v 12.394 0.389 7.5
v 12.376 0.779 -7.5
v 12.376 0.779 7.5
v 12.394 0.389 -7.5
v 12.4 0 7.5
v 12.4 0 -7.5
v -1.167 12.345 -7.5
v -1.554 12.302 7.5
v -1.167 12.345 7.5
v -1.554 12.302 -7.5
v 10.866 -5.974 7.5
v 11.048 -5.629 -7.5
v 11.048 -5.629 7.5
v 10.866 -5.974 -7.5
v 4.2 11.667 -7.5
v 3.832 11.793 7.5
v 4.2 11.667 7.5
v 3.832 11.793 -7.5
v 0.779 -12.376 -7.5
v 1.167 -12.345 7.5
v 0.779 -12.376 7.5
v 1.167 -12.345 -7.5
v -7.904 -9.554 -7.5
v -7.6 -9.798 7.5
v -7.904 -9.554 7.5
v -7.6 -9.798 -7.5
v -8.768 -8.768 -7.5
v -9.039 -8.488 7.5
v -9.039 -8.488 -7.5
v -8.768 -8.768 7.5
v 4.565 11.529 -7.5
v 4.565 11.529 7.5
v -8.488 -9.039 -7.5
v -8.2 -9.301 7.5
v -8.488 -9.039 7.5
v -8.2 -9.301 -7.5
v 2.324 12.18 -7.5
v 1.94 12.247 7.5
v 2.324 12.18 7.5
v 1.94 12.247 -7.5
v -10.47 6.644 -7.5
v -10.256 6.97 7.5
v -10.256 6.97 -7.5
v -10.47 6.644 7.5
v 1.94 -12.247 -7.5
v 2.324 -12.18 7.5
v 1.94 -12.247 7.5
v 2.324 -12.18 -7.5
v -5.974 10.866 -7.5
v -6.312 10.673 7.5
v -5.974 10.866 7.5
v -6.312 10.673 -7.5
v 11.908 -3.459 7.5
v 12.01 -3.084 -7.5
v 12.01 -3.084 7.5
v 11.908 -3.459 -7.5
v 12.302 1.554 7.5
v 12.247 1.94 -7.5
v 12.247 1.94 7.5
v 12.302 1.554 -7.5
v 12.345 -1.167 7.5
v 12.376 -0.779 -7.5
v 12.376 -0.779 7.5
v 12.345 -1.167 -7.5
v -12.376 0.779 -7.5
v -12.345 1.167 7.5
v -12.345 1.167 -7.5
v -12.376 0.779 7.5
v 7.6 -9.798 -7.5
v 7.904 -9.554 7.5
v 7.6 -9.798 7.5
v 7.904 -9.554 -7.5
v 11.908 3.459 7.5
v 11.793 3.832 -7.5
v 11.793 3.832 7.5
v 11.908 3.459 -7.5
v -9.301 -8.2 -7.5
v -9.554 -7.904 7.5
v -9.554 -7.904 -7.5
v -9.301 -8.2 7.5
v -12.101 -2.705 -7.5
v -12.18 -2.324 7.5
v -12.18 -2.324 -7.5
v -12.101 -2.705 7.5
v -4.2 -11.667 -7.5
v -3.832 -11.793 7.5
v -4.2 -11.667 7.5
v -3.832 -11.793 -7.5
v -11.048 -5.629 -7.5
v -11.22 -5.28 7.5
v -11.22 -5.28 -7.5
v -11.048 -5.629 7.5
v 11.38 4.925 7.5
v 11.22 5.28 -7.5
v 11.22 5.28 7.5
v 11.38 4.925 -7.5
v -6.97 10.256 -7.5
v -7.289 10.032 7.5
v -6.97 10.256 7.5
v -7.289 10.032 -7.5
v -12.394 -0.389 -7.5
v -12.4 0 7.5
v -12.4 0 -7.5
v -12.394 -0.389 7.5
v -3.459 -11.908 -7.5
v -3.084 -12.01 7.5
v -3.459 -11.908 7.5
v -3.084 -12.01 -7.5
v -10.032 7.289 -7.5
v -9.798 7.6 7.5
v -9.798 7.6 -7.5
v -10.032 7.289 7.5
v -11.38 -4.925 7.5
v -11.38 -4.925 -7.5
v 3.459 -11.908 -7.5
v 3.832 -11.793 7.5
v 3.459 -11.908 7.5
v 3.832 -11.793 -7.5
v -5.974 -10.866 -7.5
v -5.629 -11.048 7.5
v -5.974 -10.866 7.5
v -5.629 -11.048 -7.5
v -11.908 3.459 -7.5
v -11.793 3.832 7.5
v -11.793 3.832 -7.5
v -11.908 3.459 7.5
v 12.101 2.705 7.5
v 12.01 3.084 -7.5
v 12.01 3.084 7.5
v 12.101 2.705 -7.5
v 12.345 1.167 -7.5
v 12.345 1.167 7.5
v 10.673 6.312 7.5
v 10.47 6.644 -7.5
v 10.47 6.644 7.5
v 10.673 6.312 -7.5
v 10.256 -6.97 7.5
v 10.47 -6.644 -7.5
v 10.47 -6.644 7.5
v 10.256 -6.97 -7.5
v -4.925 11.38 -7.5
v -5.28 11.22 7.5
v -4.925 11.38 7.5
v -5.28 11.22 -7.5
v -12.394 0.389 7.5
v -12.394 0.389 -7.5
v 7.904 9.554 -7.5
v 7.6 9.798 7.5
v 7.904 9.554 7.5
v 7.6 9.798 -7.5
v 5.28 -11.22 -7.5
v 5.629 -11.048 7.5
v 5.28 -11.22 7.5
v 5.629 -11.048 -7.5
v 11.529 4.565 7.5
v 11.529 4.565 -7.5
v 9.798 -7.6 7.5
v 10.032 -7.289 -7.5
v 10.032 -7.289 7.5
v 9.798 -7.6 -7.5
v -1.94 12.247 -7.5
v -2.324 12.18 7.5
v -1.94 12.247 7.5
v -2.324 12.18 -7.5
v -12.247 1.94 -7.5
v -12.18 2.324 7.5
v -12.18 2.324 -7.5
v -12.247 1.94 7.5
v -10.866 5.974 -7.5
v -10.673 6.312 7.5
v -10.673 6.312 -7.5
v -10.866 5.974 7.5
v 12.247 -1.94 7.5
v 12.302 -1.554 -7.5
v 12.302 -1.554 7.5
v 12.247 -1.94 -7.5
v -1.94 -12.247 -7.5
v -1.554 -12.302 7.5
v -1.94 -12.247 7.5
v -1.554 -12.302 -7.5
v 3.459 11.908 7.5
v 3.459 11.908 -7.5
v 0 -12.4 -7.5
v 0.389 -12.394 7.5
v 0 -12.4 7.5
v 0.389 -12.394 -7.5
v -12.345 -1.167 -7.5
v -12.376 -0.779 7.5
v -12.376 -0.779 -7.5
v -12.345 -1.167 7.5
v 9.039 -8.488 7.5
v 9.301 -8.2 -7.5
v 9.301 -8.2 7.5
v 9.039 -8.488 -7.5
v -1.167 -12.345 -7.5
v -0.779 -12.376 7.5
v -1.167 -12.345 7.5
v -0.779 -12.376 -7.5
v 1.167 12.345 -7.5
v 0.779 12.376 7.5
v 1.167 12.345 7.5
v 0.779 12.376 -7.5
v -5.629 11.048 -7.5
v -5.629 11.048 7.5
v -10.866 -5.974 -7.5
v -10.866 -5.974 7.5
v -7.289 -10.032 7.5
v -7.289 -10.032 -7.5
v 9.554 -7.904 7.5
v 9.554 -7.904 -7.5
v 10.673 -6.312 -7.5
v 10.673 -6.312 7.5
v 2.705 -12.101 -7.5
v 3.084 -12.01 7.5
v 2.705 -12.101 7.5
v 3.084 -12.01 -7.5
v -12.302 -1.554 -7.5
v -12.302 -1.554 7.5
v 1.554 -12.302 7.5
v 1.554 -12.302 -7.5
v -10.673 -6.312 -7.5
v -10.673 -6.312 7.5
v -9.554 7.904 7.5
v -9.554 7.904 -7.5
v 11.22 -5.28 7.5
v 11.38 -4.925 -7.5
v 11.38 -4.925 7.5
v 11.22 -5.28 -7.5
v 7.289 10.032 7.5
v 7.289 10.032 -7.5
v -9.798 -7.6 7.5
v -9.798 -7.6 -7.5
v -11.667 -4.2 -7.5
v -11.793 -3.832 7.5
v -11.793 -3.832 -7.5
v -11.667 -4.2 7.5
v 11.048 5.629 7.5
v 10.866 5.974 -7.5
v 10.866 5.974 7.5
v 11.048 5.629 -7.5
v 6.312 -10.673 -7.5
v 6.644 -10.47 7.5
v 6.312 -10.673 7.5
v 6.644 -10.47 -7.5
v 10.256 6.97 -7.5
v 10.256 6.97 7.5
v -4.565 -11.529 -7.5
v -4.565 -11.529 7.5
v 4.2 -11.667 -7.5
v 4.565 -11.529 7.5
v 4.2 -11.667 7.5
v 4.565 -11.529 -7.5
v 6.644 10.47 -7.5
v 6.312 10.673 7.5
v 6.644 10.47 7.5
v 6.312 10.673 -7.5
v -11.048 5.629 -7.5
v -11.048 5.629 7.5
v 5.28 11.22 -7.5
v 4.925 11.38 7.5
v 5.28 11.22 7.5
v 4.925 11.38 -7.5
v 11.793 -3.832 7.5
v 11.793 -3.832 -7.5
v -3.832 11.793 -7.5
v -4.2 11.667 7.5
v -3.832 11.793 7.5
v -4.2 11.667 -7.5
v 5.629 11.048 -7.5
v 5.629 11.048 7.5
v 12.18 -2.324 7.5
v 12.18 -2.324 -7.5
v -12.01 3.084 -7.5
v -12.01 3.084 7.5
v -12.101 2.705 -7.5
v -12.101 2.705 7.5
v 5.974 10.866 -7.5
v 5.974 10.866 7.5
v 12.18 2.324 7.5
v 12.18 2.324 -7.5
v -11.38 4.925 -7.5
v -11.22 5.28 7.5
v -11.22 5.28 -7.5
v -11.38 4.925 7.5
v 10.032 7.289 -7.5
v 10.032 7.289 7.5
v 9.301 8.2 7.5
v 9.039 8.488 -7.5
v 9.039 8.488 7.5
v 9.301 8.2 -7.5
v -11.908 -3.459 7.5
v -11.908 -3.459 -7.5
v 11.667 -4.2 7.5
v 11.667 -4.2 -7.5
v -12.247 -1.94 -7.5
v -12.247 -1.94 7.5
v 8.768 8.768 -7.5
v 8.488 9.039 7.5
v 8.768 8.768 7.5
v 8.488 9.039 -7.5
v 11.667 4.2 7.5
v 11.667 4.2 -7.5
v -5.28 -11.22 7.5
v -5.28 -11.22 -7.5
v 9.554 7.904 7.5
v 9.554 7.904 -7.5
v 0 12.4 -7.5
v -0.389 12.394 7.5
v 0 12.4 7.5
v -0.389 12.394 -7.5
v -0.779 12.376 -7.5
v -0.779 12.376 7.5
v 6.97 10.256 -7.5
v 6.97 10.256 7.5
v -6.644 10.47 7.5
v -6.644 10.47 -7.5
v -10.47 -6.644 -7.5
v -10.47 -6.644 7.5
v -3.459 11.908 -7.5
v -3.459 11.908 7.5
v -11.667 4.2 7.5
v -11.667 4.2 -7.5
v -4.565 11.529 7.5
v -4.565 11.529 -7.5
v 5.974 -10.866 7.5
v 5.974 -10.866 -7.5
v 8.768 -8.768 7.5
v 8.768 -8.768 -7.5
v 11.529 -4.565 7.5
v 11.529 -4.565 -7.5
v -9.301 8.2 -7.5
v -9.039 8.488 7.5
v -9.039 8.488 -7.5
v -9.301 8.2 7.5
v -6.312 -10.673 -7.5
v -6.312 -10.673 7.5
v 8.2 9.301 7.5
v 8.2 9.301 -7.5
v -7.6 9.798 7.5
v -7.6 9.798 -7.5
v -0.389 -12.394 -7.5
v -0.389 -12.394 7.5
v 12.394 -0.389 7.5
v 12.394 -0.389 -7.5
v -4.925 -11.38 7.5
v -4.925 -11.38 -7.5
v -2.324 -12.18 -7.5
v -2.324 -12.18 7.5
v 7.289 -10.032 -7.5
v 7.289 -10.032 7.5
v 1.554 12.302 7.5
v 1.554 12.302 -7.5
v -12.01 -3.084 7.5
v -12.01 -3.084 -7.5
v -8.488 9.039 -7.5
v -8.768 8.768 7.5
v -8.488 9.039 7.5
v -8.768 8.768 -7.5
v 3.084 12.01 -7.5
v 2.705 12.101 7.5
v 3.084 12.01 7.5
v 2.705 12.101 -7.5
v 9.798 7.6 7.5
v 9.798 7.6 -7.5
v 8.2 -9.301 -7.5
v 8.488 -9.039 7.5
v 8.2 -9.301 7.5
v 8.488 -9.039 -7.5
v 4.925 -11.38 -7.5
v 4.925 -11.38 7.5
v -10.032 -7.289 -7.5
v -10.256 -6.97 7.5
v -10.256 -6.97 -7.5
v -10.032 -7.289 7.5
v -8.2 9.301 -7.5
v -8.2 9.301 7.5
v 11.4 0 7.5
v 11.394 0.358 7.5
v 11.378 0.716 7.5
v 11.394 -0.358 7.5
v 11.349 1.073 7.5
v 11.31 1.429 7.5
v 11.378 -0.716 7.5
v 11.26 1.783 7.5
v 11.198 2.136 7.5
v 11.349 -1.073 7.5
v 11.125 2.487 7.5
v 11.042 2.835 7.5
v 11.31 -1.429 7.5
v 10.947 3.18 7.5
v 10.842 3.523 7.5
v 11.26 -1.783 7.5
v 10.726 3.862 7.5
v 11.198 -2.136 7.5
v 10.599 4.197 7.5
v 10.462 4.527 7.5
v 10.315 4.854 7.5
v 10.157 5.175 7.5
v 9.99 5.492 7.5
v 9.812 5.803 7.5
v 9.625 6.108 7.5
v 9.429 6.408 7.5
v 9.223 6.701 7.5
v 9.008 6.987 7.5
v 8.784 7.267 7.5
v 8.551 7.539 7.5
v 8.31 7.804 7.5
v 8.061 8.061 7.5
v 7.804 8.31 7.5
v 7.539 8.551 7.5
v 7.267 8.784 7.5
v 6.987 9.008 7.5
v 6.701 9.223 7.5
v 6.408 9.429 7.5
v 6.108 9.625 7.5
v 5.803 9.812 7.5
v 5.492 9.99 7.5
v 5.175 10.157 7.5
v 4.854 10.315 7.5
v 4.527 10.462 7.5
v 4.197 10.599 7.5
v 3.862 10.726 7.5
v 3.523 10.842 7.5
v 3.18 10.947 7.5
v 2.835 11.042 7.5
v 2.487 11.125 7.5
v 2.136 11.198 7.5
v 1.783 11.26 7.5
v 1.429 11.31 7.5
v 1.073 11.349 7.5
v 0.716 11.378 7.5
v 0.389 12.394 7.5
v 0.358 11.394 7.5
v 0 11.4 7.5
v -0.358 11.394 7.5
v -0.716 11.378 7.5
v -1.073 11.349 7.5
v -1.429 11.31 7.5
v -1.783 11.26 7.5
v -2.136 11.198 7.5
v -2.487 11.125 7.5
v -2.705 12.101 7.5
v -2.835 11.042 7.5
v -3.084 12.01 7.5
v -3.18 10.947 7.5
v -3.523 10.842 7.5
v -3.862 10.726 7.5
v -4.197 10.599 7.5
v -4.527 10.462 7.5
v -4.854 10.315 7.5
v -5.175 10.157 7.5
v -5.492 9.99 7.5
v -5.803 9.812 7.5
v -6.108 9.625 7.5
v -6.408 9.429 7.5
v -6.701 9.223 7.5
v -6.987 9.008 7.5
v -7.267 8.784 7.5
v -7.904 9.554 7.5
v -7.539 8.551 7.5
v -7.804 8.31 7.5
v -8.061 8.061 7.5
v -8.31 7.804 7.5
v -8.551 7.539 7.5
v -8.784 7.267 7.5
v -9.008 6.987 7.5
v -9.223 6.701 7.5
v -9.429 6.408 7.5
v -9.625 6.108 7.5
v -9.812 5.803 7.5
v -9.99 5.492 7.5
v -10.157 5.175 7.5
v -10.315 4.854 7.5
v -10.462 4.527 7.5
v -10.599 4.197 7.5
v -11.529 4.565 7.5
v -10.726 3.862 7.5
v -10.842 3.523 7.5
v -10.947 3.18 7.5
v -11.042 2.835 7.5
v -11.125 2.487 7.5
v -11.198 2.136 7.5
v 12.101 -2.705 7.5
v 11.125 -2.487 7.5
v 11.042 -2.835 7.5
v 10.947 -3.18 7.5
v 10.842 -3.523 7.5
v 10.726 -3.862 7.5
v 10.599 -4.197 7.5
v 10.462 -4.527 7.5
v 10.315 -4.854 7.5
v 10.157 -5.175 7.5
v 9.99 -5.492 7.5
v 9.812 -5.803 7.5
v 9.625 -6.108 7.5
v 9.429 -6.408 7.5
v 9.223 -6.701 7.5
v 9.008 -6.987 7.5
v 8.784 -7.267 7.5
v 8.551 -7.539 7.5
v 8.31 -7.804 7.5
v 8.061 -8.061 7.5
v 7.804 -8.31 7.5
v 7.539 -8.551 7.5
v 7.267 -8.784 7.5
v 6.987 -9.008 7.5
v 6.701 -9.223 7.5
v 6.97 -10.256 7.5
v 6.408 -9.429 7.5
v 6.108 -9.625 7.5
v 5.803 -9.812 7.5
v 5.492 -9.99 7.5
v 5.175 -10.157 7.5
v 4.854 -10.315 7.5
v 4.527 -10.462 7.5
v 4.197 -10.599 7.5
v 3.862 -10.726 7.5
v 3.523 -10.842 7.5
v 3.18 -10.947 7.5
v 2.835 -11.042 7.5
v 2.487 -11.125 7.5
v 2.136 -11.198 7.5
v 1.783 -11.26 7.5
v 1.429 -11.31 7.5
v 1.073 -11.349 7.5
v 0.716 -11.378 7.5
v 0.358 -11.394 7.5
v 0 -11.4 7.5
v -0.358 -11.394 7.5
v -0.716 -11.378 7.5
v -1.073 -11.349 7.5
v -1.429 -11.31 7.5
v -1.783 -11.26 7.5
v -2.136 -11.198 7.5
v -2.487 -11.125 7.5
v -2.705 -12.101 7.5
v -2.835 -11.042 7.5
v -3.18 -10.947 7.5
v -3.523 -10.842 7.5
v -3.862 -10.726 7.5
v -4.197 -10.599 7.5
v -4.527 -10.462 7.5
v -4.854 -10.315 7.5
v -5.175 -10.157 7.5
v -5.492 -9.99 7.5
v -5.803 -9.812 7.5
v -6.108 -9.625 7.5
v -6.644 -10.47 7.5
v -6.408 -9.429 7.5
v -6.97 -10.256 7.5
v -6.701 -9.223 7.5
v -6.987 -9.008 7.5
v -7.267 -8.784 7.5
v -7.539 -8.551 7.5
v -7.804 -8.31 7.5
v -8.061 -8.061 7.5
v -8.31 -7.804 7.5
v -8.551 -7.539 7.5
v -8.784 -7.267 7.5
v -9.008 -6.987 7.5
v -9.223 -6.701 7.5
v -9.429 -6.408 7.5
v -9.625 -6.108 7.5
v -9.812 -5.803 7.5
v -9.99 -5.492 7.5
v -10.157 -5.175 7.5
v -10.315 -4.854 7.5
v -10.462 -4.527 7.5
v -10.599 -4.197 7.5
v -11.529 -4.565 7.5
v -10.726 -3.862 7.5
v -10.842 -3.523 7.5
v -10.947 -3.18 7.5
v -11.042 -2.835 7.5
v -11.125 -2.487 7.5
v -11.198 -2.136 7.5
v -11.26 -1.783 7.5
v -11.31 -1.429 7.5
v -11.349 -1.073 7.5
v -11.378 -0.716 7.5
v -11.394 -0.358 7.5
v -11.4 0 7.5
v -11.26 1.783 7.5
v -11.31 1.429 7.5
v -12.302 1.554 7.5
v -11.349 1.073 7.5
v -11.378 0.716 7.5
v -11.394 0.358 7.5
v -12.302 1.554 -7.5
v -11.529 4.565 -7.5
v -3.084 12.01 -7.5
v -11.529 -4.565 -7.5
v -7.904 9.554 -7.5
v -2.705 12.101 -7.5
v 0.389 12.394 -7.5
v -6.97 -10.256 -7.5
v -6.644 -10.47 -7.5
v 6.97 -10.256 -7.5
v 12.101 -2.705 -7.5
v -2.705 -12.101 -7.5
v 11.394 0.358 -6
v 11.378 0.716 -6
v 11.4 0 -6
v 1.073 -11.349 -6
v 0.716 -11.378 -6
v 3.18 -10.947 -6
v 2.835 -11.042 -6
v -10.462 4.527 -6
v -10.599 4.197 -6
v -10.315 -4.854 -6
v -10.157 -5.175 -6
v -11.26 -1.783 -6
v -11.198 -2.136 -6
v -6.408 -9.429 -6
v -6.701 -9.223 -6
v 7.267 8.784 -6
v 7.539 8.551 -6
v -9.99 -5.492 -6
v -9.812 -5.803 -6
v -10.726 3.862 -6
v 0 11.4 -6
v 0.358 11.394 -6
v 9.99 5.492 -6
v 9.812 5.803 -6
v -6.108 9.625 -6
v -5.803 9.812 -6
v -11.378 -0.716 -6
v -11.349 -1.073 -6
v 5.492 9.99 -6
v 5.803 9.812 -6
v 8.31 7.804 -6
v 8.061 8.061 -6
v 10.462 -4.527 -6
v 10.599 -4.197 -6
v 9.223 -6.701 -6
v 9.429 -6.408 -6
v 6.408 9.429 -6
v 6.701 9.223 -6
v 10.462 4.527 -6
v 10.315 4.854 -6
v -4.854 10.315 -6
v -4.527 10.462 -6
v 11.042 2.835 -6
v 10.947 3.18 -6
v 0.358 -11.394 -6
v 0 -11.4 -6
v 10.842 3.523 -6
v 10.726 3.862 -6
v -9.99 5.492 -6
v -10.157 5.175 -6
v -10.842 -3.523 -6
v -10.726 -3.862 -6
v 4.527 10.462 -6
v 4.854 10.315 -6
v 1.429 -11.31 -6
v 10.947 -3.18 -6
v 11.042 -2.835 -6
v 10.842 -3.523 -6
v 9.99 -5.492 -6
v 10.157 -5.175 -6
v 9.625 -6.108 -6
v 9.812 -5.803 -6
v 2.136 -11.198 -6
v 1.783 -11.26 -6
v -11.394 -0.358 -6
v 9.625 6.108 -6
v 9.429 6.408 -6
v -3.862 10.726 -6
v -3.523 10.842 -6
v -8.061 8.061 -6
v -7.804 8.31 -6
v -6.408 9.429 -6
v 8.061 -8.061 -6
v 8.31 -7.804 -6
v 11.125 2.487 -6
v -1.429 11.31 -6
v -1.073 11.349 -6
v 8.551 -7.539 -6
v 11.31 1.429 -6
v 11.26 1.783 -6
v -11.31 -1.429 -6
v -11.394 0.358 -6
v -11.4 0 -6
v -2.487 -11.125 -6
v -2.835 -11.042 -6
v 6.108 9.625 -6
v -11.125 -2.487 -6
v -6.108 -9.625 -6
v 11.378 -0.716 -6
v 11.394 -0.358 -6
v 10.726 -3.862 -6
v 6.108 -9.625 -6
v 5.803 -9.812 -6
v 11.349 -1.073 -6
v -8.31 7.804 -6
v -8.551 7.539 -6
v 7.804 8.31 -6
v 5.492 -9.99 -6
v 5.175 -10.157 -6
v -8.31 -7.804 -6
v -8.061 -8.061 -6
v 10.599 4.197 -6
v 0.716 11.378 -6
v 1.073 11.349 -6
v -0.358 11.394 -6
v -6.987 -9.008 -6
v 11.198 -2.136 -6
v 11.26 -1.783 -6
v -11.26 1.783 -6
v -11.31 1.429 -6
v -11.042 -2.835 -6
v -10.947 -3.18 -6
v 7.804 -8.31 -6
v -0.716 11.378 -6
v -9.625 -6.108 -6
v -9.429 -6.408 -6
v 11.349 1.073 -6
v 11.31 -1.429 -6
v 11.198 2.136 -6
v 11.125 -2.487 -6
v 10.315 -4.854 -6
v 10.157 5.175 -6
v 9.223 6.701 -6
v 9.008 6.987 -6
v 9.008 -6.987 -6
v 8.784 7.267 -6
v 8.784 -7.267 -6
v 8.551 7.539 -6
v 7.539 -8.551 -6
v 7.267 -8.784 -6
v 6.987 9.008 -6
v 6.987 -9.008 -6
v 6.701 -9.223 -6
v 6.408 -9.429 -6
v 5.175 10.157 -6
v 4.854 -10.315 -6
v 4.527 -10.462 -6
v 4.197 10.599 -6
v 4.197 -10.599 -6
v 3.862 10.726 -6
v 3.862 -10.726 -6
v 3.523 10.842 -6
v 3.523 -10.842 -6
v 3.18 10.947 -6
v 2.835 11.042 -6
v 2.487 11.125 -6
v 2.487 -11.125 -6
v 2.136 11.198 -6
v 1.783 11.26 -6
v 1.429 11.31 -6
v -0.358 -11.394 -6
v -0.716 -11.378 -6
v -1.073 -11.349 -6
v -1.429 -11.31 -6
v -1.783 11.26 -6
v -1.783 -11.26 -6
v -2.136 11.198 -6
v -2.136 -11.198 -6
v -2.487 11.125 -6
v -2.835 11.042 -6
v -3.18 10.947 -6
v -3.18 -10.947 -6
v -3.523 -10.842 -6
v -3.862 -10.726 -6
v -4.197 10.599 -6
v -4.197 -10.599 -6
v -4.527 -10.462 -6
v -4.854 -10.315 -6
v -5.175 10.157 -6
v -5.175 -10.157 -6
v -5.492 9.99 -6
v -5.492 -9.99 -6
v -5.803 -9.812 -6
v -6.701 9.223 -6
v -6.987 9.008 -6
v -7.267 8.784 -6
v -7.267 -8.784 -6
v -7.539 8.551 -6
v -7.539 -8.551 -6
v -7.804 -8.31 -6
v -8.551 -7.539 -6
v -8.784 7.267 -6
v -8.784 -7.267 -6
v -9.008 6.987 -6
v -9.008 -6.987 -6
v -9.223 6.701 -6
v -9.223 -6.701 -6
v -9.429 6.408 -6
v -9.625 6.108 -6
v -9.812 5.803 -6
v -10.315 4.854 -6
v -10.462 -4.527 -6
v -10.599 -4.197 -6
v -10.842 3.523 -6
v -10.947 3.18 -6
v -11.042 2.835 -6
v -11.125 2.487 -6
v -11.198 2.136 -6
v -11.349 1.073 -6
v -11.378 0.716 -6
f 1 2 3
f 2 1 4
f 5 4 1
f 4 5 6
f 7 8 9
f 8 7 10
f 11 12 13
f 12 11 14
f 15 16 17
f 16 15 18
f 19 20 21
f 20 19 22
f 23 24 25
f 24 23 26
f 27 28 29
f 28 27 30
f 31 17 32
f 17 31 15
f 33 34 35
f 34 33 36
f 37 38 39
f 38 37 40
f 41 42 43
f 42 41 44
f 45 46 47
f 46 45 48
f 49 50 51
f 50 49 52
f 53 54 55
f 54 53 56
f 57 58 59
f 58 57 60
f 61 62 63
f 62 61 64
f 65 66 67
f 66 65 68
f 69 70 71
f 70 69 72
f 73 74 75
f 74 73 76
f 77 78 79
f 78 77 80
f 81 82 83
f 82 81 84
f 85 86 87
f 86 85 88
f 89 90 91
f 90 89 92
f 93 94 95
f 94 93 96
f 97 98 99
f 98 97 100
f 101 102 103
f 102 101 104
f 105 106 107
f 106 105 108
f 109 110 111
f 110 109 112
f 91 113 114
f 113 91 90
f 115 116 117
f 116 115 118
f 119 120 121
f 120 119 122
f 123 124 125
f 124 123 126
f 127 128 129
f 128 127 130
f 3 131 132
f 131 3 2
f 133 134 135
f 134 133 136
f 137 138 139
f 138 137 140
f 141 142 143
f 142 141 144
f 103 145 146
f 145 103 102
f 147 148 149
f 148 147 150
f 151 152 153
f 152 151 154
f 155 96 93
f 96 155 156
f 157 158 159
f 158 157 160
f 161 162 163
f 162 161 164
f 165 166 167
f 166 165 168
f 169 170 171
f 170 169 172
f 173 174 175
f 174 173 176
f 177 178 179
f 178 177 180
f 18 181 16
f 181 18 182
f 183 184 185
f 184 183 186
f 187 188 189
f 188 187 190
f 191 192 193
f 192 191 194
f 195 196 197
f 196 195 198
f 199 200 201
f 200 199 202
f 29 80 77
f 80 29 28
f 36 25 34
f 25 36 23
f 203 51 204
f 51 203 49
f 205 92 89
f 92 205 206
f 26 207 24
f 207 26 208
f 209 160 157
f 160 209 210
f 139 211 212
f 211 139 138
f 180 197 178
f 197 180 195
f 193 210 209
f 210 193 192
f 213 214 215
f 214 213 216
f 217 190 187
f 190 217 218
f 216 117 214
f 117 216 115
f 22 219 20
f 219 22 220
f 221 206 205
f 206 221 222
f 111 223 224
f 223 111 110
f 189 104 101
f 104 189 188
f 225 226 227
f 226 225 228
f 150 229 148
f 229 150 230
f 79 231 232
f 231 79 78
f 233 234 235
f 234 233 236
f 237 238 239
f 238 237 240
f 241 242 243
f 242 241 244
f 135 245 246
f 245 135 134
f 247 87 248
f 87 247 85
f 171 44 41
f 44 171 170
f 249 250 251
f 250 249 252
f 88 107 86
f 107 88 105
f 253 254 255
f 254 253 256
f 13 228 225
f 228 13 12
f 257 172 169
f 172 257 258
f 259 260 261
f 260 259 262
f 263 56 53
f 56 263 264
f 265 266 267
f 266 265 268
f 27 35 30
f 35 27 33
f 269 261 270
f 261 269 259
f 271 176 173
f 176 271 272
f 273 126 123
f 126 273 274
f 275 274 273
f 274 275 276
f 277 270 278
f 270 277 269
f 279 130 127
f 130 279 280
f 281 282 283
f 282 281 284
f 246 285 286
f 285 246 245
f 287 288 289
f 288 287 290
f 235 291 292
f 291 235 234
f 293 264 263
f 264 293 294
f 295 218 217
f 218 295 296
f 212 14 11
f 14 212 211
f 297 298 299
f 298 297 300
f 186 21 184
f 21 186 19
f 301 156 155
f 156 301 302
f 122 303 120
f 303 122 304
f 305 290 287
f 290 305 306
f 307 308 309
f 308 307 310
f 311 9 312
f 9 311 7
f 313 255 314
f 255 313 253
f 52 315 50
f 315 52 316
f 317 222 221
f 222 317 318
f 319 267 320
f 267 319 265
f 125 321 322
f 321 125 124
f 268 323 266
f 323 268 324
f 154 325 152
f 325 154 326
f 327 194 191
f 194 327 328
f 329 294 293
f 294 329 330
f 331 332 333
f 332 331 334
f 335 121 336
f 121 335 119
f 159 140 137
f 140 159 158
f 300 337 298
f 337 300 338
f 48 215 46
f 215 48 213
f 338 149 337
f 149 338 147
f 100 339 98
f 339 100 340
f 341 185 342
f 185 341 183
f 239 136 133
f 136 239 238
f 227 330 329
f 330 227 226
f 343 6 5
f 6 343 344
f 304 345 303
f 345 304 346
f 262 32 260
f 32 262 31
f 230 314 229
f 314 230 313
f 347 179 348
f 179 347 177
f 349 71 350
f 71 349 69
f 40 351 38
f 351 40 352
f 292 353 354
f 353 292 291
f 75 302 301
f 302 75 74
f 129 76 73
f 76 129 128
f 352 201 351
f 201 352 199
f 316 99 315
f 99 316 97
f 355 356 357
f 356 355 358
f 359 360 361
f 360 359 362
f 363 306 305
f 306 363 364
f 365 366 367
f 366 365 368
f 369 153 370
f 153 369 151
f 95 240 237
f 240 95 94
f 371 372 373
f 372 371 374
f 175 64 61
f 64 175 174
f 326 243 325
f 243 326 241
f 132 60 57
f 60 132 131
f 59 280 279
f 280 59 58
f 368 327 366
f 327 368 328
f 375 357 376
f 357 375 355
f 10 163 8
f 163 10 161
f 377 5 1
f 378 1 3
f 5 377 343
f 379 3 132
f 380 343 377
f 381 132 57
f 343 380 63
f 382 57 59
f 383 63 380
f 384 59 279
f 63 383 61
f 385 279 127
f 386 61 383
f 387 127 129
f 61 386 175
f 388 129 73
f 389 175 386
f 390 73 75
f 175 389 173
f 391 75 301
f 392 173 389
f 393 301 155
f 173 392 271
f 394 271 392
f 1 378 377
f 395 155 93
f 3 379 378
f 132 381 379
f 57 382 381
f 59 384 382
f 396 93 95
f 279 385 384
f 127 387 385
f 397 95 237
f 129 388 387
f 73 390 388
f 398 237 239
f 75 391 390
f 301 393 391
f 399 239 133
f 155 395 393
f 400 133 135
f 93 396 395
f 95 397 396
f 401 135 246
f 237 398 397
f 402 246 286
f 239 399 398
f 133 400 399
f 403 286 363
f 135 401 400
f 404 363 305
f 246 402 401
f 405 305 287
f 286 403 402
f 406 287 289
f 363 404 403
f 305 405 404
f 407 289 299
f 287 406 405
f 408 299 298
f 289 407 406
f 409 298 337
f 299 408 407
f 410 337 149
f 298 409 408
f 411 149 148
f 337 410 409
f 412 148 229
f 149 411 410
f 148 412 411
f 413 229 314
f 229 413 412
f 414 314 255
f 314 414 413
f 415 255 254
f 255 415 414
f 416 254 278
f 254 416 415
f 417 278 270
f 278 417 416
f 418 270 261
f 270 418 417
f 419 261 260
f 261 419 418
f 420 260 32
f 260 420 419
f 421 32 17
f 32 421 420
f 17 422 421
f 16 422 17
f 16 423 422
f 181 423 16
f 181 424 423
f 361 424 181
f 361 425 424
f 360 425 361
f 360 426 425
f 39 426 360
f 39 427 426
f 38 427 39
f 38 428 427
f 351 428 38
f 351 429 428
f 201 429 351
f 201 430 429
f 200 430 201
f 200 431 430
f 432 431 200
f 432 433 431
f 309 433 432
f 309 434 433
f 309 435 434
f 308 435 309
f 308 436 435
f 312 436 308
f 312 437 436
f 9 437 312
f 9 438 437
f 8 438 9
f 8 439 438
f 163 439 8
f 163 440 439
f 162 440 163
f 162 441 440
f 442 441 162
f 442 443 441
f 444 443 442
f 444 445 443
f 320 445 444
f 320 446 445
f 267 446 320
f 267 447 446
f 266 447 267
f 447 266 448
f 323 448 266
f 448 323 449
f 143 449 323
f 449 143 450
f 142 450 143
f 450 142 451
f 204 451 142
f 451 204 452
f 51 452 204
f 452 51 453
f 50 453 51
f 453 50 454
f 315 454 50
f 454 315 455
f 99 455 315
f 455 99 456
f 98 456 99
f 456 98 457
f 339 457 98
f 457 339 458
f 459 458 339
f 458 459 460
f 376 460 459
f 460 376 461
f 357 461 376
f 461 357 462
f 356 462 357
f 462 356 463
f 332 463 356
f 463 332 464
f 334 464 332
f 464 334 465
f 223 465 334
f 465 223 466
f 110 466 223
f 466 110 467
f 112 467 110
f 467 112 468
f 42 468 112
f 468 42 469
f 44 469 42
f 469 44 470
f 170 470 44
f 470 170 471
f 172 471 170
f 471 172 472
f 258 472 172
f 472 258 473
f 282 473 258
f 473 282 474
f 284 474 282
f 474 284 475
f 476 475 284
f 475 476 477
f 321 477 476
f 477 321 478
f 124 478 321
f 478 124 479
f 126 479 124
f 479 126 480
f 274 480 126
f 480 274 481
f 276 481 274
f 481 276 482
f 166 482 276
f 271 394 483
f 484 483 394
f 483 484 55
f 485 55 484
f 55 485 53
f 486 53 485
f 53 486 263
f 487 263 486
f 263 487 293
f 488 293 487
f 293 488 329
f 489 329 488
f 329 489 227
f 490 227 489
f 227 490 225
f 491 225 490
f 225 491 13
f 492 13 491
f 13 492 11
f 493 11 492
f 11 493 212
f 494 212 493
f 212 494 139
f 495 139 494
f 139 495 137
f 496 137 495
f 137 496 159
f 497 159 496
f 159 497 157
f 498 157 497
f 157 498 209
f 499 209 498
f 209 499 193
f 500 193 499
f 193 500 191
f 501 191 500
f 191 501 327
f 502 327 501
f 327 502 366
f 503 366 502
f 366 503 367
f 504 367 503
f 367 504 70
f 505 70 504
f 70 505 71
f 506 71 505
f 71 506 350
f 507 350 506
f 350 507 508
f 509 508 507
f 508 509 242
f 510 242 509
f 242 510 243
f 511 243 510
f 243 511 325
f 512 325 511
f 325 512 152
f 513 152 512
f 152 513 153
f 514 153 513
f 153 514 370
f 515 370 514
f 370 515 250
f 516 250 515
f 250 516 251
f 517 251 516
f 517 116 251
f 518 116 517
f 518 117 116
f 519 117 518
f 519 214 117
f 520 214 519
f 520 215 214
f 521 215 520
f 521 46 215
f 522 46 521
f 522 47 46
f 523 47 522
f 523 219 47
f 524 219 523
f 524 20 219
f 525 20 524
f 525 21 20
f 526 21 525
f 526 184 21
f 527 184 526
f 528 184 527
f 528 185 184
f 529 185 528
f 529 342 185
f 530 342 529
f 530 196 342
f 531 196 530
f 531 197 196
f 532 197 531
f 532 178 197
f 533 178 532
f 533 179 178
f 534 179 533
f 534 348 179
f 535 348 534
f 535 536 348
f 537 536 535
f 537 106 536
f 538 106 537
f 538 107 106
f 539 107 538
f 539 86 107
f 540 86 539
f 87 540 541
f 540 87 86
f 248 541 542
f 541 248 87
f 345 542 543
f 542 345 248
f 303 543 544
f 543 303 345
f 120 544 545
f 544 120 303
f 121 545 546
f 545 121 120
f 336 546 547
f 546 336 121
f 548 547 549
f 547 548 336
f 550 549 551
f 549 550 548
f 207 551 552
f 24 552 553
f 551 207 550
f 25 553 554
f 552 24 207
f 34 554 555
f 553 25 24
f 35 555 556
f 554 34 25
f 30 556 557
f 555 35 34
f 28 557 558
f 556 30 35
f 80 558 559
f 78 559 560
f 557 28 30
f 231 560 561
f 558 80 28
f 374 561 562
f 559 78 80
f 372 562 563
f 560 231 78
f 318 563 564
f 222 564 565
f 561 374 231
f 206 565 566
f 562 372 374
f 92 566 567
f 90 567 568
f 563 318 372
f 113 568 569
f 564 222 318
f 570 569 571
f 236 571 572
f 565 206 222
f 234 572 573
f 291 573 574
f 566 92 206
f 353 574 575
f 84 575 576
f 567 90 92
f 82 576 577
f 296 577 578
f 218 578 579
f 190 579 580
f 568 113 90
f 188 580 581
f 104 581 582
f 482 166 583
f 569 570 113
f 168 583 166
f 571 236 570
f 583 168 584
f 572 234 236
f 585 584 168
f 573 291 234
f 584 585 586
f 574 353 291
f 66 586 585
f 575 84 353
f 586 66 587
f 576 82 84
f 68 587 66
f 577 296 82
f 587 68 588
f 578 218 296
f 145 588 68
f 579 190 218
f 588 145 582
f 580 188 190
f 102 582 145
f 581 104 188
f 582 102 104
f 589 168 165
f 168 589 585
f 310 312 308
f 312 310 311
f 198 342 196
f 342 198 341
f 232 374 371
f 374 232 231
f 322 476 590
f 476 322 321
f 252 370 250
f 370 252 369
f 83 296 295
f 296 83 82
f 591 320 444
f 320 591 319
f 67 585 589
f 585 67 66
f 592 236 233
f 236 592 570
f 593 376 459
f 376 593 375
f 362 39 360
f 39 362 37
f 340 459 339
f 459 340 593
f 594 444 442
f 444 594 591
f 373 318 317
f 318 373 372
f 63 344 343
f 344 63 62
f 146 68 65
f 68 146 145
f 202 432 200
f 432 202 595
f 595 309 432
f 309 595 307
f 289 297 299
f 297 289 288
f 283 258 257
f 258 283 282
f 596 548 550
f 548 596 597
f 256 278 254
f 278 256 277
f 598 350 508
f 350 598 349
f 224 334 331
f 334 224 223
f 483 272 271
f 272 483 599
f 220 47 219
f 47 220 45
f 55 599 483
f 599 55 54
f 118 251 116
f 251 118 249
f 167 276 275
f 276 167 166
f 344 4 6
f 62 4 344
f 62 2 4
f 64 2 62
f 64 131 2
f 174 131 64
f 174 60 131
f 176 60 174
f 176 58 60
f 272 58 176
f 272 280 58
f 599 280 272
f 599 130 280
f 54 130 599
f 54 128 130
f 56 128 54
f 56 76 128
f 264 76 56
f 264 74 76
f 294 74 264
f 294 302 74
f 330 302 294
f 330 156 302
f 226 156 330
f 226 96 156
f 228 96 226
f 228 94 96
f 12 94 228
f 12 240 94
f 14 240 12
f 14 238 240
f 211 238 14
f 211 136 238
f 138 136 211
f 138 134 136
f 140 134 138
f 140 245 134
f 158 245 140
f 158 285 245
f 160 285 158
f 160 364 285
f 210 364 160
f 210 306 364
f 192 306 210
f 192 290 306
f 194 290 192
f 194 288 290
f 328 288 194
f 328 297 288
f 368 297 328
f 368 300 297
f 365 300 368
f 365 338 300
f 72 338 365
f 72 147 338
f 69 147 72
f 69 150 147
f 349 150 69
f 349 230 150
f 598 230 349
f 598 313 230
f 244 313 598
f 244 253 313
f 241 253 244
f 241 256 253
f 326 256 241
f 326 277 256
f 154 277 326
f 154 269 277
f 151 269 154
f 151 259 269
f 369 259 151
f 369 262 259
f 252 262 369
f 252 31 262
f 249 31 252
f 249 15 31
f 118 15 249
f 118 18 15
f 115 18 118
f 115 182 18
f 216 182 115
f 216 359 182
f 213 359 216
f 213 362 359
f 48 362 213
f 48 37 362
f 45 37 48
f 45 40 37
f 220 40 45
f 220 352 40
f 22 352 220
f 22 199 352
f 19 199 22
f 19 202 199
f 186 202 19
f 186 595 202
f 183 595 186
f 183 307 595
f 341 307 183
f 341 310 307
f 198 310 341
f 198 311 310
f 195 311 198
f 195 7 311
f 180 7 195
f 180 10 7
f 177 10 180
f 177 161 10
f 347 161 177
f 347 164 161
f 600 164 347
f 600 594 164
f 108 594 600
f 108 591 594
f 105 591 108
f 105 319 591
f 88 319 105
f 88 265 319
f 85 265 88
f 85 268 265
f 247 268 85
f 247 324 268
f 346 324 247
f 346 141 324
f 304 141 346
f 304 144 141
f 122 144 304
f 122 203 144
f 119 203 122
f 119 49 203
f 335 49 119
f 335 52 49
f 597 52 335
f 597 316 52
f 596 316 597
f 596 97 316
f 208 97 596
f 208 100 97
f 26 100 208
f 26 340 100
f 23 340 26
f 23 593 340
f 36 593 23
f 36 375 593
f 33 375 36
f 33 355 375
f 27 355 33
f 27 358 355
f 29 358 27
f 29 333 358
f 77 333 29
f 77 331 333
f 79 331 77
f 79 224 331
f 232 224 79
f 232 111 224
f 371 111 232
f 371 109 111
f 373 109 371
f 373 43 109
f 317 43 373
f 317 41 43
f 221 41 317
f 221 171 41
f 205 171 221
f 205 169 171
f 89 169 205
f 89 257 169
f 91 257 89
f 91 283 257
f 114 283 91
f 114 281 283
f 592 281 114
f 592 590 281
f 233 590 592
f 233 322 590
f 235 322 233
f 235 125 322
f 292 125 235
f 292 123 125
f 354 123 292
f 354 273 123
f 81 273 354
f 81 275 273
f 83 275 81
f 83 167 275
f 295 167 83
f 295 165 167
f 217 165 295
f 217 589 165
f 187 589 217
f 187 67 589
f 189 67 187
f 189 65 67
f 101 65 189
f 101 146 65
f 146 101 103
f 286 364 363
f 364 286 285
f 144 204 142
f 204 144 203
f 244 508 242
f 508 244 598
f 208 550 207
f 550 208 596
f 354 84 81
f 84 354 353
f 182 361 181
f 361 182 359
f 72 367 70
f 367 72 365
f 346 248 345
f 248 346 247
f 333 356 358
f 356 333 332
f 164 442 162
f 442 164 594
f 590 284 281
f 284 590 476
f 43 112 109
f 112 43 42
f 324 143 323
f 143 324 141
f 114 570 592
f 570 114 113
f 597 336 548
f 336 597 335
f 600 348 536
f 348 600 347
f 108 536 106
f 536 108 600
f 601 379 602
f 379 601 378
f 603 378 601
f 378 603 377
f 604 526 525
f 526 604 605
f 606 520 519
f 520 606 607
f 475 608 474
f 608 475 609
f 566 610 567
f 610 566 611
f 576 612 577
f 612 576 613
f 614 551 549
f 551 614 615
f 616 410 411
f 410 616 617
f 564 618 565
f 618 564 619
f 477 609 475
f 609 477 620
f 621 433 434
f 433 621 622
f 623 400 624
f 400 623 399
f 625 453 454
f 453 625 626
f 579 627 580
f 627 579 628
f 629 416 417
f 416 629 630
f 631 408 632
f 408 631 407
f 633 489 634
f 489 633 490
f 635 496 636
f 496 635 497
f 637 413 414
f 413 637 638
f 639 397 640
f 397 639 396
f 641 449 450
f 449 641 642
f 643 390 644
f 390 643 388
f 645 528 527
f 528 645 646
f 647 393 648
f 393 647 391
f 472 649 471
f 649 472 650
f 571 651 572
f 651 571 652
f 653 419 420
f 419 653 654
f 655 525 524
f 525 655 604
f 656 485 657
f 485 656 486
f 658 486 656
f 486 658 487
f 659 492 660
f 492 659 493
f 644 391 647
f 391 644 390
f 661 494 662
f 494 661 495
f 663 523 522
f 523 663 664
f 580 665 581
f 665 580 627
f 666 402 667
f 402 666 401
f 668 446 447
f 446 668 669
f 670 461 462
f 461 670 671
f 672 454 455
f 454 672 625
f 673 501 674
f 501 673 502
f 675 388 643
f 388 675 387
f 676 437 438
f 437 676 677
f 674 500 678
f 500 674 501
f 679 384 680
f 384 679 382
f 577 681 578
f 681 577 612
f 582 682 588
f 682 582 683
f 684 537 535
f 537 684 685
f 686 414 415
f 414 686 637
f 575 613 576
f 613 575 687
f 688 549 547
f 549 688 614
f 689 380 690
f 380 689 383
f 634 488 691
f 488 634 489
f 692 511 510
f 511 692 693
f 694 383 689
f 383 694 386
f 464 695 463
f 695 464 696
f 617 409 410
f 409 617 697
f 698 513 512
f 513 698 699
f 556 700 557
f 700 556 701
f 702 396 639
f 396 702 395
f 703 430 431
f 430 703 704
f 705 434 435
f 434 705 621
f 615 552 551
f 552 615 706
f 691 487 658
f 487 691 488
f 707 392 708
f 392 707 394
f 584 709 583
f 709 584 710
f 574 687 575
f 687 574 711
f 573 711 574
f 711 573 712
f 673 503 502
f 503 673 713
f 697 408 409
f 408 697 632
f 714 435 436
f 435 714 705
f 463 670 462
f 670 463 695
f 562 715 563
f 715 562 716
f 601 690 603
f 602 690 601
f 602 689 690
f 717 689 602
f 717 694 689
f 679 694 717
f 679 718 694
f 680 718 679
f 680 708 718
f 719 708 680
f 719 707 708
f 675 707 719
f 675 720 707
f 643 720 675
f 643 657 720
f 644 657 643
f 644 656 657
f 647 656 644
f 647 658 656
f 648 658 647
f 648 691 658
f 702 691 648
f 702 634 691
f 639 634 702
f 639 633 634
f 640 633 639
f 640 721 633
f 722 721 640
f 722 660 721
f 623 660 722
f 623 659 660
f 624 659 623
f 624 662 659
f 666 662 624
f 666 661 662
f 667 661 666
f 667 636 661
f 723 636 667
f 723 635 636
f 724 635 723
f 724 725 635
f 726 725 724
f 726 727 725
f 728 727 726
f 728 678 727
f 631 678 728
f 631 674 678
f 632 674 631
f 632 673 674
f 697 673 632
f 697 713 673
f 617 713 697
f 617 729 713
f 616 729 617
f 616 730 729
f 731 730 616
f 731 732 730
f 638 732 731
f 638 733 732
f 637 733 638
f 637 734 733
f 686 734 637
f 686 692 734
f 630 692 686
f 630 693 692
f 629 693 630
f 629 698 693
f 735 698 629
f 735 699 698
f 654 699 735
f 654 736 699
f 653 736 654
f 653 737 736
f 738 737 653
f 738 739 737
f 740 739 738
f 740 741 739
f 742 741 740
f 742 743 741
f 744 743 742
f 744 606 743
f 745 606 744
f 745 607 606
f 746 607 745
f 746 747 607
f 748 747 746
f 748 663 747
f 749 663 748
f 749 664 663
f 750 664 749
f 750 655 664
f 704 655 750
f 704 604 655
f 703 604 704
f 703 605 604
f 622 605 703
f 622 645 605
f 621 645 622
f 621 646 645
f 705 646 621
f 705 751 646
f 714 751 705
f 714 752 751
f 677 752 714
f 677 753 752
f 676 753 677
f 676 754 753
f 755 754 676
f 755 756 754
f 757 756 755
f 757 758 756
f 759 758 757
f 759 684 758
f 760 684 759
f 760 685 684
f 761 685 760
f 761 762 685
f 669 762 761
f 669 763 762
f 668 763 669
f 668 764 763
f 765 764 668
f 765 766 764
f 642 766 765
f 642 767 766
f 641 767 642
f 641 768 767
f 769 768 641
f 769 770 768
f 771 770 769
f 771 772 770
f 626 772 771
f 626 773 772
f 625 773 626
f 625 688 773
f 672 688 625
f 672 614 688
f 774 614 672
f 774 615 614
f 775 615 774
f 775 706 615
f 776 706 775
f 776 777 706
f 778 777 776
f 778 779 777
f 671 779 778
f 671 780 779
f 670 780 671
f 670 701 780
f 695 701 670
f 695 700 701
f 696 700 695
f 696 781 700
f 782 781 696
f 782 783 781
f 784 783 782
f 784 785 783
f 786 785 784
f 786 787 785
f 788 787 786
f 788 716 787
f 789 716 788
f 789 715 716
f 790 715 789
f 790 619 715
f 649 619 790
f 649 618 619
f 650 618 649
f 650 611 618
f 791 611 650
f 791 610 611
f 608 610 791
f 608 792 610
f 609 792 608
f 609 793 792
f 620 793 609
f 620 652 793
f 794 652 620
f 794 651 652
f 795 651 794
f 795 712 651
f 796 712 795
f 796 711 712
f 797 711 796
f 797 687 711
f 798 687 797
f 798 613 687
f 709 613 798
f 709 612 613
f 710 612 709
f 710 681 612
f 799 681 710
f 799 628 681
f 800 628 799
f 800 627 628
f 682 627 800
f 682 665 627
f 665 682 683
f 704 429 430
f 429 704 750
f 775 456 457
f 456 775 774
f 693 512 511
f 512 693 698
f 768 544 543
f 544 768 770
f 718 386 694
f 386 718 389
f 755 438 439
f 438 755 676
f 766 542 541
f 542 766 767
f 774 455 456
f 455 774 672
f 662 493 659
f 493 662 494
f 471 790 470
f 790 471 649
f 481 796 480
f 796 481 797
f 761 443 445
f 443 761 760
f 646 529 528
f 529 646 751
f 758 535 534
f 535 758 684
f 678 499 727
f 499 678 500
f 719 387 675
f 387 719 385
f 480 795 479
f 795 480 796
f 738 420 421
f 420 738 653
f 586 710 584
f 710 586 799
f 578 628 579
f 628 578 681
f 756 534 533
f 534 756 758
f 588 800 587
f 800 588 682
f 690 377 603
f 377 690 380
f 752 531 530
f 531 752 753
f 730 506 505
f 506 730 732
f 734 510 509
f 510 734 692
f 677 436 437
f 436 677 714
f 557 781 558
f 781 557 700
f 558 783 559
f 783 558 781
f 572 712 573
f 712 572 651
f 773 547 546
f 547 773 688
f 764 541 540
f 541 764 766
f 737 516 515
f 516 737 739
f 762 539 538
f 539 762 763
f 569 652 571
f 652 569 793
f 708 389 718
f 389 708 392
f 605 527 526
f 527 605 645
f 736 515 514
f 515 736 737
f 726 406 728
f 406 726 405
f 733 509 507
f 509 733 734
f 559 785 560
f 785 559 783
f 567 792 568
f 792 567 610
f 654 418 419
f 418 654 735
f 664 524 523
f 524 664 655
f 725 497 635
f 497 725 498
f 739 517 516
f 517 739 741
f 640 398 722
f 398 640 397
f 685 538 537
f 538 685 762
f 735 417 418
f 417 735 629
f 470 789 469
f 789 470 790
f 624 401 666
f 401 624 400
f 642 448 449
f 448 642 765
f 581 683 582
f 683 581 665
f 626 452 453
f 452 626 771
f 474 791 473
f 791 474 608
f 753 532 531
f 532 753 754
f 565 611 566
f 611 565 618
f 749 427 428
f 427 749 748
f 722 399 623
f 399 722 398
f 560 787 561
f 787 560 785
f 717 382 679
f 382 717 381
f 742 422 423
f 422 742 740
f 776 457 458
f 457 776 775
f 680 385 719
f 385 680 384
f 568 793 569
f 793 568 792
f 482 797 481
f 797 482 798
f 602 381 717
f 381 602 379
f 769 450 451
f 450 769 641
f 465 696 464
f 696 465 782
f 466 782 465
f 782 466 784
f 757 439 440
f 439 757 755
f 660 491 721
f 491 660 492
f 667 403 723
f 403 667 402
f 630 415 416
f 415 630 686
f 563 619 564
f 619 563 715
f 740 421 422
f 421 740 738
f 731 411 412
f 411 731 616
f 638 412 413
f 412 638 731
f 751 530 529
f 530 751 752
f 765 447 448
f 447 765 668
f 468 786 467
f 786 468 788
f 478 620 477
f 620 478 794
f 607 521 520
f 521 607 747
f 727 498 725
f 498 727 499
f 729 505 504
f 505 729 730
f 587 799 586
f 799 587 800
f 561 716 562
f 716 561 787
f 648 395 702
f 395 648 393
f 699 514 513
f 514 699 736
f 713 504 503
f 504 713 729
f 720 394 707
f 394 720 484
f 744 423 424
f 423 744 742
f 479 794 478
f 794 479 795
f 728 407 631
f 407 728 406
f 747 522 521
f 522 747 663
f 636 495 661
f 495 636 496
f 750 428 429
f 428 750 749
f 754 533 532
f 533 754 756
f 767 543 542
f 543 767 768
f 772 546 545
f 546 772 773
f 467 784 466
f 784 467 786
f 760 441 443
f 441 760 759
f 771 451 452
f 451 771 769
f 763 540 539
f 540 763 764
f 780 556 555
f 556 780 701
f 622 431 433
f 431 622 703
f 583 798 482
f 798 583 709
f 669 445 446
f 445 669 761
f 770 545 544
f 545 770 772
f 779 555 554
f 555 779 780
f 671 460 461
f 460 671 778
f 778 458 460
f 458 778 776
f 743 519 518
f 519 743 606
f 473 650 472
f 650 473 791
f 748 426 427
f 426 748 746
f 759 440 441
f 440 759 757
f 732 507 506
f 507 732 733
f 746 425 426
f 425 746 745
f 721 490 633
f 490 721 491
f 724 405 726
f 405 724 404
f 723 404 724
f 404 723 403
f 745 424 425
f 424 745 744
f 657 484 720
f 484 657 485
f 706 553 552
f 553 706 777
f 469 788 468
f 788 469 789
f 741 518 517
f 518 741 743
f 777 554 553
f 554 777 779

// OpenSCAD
$fn=200;


//translate([0,0,thickness+7])
//cylinder(h=height-thickness, r=radius, center=true);

module foot(height=15, radius=21/2, thickness=1) {
difference() {
cylinder(h=height, r=radius+thickness, center=true);
translate([0,0,thickness])
cylinder(h=height-thickness, r=radius, center=true);
}
}
// front
foot(radius=22.8/2);
// back
//foot(radius=25.5/2);
